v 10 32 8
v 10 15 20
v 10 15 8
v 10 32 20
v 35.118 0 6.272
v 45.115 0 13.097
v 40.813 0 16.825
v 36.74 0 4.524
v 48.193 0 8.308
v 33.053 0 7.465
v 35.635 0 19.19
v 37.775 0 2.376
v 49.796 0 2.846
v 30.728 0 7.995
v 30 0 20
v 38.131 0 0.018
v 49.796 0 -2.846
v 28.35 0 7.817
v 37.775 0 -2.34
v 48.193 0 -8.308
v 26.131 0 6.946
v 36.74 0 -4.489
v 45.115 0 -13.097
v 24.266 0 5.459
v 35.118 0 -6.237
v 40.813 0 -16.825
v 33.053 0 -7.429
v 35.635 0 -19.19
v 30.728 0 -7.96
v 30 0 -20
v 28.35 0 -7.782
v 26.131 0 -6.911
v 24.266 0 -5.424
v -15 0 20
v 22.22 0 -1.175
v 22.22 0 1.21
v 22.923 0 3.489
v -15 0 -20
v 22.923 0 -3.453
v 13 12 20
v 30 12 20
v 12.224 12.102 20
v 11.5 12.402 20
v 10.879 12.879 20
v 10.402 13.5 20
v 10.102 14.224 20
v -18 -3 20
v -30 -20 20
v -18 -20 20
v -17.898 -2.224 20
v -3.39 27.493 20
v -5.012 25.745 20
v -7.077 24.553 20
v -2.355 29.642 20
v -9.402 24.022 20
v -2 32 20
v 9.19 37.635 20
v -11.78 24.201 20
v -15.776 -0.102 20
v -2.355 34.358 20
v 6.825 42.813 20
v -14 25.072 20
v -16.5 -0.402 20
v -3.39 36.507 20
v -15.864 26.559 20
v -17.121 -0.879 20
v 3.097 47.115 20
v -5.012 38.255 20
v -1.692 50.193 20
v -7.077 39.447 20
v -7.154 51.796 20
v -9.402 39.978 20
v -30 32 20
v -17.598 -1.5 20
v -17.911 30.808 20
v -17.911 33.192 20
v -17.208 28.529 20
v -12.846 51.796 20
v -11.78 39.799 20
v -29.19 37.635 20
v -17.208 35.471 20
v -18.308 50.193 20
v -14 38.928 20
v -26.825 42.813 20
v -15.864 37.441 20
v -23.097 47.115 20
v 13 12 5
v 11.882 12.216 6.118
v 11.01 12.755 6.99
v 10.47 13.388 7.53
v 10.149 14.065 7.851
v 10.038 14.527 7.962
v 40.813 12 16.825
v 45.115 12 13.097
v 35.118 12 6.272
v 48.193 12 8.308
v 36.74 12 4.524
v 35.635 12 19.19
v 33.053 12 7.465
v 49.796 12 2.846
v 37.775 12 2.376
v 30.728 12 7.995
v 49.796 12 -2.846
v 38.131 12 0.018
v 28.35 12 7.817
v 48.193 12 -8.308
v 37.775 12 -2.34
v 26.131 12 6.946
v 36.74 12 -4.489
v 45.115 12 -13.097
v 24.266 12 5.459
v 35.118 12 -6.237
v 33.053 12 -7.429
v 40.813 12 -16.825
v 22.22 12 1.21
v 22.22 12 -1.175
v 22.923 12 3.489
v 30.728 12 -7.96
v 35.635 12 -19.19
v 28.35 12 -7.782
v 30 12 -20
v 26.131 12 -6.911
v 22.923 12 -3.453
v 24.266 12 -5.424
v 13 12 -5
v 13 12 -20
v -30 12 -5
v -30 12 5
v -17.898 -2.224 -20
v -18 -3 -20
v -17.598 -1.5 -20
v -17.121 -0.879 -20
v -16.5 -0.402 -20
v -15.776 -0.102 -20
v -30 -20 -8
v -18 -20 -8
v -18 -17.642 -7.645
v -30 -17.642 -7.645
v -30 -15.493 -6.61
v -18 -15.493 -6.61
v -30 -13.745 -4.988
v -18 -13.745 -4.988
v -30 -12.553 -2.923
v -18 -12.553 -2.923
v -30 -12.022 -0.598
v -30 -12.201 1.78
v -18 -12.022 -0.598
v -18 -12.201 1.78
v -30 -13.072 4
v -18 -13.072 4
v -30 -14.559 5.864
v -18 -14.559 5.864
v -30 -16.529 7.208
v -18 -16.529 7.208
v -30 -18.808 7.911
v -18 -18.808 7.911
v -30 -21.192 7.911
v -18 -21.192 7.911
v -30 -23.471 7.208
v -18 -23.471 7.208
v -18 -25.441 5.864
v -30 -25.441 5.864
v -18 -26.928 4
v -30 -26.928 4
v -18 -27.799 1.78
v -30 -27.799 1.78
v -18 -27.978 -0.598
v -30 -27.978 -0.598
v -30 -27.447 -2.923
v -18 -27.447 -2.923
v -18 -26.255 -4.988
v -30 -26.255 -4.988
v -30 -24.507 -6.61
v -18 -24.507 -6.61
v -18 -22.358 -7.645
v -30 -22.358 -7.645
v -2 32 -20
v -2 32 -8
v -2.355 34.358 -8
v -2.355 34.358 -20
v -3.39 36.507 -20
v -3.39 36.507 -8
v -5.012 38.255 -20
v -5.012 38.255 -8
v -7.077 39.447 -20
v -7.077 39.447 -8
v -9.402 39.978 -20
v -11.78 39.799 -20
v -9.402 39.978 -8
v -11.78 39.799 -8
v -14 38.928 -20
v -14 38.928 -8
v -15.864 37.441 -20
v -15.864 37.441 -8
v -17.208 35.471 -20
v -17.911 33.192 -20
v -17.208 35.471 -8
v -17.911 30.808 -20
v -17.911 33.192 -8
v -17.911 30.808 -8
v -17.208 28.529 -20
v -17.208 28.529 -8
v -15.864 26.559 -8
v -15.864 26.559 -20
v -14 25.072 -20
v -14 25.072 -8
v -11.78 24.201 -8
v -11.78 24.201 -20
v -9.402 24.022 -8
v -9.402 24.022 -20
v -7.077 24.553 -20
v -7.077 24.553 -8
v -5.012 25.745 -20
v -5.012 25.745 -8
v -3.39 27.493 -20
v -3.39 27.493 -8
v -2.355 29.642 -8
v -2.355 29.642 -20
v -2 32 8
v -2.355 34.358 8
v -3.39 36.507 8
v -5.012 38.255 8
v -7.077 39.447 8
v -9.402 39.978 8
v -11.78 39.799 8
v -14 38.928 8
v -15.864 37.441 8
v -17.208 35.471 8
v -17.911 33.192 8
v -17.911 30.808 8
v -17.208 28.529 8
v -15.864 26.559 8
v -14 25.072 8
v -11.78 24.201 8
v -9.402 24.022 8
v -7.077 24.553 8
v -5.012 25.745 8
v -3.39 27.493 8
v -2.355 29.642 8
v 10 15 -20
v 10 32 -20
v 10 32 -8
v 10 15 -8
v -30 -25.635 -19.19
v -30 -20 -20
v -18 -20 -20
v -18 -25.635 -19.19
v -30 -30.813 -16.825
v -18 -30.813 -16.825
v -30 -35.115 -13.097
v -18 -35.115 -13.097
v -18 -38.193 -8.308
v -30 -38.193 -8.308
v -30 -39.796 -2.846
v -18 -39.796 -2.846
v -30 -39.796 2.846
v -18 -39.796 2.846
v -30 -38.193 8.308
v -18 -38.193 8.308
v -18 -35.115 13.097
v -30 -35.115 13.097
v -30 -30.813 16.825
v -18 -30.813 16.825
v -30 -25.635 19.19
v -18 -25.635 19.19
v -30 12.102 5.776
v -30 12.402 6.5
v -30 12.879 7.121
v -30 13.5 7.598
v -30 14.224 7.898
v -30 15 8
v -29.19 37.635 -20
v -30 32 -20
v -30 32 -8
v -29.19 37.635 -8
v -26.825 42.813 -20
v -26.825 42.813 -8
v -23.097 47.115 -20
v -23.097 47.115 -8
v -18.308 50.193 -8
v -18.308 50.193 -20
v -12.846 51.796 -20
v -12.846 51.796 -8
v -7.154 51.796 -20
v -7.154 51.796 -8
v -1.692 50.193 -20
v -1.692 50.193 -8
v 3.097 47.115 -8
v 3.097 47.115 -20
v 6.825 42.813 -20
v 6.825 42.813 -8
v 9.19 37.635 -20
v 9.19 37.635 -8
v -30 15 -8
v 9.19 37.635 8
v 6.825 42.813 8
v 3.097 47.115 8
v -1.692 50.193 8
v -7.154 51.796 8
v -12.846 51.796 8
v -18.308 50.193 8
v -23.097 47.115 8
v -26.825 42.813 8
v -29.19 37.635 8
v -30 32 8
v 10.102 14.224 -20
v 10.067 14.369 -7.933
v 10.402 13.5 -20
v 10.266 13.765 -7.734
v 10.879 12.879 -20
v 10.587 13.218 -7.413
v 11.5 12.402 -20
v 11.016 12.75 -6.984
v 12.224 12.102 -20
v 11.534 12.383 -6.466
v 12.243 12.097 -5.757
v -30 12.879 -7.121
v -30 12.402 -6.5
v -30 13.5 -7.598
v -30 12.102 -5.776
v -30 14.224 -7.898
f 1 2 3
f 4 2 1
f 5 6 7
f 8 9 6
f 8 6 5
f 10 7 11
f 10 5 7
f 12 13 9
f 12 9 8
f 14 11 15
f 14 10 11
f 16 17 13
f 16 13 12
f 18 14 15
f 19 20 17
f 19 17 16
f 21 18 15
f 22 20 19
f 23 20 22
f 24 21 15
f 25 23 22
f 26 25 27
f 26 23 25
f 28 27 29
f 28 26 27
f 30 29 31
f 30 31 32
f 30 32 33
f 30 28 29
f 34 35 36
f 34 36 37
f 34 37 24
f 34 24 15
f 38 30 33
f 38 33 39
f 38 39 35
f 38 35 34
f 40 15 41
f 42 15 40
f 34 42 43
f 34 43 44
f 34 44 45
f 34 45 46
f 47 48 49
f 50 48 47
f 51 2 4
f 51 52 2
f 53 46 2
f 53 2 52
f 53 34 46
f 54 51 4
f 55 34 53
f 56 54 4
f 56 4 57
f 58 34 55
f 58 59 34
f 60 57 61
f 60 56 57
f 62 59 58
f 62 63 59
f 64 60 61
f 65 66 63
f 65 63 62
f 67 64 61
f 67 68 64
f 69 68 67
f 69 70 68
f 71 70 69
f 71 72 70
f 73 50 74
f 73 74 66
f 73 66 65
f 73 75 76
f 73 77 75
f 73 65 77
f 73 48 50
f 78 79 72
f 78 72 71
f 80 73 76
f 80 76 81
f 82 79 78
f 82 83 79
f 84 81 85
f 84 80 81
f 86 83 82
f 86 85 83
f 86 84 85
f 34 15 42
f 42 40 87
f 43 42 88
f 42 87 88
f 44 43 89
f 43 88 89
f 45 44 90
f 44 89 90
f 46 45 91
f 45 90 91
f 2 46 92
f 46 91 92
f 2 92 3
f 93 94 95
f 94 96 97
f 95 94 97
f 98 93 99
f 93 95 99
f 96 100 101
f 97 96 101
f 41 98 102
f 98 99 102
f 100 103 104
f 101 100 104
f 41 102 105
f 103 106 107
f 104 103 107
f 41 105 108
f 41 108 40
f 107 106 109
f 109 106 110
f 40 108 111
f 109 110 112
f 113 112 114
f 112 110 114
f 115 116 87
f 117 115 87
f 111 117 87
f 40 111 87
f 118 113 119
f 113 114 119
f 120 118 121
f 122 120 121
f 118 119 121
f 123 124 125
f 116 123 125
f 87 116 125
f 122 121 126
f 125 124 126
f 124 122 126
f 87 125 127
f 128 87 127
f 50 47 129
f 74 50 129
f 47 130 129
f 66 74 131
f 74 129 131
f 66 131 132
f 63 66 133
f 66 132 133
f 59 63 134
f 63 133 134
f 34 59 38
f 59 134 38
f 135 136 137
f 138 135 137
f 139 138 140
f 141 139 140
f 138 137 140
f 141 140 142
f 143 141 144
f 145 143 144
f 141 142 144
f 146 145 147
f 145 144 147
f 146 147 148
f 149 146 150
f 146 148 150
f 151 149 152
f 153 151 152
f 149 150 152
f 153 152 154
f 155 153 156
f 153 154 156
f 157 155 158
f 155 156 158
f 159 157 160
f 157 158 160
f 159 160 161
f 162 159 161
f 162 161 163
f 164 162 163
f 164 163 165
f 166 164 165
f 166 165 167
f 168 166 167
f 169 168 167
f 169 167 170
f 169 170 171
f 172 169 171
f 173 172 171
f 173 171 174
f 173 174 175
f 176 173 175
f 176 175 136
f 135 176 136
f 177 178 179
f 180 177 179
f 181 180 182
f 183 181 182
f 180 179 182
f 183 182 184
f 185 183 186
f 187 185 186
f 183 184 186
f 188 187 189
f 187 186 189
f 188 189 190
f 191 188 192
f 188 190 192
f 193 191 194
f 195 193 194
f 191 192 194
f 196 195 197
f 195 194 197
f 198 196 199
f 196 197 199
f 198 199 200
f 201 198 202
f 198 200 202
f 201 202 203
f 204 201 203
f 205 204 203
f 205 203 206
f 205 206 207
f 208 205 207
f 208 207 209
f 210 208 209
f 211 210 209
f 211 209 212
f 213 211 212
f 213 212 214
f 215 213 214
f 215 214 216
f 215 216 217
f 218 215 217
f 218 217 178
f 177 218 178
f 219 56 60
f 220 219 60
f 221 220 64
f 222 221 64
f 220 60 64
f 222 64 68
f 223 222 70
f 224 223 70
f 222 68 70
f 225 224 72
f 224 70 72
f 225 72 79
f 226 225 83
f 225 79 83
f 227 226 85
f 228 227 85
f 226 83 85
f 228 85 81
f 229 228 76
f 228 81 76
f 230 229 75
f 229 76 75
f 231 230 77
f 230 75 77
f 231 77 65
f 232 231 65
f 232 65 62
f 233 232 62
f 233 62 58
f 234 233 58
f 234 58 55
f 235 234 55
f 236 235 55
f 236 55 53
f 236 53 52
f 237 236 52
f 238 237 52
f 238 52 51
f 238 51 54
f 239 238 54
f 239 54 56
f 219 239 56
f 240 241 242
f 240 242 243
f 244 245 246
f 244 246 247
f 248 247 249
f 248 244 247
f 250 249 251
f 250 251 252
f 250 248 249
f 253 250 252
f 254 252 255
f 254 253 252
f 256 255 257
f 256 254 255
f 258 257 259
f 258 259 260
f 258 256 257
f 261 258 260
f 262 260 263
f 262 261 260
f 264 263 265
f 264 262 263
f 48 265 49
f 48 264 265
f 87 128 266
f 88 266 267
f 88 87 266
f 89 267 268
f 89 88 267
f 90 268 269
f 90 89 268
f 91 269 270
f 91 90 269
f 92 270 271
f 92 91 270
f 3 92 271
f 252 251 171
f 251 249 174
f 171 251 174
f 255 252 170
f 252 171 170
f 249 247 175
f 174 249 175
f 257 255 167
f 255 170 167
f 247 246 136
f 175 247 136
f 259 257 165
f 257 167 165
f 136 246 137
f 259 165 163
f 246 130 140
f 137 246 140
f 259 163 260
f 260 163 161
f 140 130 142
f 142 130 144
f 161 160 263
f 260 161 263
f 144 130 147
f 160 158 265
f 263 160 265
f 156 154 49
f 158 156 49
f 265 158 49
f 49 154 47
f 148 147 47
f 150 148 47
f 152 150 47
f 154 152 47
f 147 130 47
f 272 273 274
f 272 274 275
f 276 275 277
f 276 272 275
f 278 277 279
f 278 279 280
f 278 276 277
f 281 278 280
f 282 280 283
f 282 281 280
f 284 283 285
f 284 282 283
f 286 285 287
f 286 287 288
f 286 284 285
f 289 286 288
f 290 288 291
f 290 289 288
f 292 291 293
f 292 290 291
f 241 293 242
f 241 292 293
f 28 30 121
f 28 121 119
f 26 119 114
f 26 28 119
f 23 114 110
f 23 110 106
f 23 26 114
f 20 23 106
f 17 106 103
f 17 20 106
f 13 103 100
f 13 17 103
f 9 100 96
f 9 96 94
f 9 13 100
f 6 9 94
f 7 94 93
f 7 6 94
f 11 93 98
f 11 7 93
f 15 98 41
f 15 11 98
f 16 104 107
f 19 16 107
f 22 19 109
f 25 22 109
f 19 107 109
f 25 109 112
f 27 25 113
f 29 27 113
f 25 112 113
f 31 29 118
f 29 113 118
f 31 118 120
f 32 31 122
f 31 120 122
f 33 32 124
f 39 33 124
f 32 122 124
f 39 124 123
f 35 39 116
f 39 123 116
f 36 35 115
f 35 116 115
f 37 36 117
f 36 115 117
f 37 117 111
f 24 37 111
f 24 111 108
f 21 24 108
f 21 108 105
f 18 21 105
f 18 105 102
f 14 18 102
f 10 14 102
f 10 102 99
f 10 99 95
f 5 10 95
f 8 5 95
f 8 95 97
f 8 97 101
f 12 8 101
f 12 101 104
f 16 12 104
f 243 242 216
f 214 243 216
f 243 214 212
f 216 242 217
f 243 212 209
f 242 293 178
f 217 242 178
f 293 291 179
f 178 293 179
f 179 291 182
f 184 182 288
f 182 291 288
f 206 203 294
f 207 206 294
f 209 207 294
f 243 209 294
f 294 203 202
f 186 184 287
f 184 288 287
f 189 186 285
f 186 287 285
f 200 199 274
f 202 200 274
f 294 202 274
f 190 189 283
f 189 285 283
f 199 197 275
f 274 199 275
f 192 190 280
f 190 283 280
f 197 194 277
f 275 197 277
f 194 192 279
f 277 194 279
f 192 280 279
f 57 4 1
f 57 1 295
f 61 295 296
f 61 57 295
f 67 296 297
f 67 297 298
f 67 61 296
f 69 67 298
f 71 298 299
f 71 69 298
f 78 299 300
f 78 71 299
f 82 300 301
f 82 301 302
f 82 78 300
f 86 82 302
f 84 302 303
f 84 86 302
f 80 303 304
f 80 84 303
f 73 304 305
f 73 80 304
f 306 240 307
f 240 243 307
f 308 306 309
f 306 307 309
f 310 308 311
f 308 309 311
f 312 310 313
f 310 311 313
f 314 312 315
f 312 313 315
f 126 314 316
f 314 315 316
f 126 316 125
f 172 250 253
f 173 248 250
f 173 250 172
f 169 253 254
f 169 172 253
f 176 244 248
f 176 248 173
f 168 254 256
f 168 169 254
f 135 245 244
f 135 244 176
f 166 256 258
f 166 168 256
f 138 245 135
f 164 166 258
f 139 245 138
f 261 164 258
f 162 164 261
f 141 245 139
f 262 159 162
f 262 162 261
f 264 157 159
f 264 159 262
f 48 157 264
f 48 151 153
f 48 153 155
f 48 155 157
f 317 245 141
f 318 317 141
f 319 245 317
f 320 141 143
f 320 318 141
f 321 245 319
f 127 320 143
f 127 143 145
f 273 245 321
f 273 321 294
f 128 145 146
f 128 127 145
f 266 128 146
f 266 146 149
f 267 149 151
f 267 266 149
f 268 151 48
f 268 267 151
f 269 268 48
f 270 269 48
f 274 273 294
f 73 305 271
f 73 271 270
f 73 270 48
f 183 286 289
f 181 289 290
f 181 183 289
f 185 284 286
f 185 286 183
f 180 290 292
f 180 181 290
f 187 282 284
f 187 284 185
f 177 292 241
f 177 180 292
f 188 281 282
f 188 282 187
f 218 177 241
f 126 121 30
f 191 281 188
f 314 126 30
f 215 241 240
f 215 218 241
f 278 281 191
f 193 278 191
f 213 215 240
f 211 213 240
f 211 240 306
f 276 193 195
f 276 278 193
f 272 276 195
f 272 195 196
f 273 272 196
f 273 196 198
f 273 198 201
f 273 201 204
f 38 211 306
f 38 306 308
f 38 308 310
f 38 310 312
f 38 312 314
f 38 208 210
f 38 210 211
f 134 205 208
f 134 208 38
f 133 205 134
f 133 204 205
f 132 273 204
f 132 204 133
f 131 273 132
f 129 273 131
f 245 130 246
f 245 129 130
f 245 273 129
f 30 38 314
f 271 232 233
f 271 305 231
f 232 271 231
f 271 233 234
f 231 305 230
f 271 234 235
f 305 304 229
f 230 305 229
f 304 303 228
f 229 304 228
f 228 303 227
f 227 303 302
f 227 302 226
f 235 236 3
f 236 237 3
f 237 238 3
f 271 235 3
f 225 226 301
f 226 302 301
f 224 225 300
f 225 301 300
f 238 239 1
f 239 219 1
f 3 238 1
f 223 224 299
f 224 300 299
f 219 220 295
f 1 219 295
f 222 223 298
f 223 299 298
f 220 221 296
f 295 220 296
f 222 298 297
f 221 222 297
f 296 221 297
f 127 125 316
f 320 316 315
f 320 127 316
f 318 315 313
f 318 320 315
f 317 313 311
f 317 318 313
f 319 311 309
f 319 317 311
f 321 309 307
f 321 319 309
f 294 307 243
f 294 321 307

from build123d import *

# Parameters (mm, degrees)
BOSS_EXTRUDE1_DEPTH  = 12
BOSS_EXTRUDE11_DEPTH = 12
BOSS_EXTRUDE12_DEPTH = 12
BOSS_EXTRUDE13_DEPTH = 12
SKETCH8_R            = 8
CUT_EXTRUDE1_DEPTH   = 128
SKETCH9_R            = 8
CUT_EXTRUDE2_DEPTH   = 128
SKETCH10_R           = 8
CUT_EXTRUDE4_DEPTH   = 128
FILLET4_R            = 3


with BuildPart() as part:
    # Sketch2 → Boss-Extrude1 (new body)
    with BuildSketch(Plane(origin=(0, 0, 0), x_dir=(1, 0, 0), z_dir=(0, 1, 0))):
        with BuildLine():
            Line((-30, 20), (30, 20))
            ThreePointArc((30, 20), (50, 0), (30, -20))
            Line((30, -20), (-30, -20))
            Line((-30, -20), (-30, 20))
        make_face()
    extrude(amount=BOSS_EXTRUDE1_DEPTH)

    # Sketch3 → Boss-Extrude11 (add)
    with BuildSketch(Plane.XY.offset(20)):
        with BuildLine():
            ThreePointArc((10, 32), (-10, 52), (-30, 32))
            Line((-30, 32), (10, 32))
        make_face()
        with BuildLine():
            ThreePointArc((-30, 32), (-24.142135624, 17.857864376), (-10, 12))
            ThreePointArc((-10, 12), (4.142135624, 17.857864376), (10, 32))
            Line((10, 32), (-30, 32))
        make_face()
        with BuildLine():
            Line((-30, 32), (-30, 12))
            Line((-30, 12), (-10, 12))
            ThreePointArc((-10, 12), (-24.142135624, 17.857864376), (-30, 32))
        make_face()
        with BuildLine():
            ThreePointArc((10, 32), (4.142135624, 17.857864376), (-10, 12))
            Line((-10, 12), (10, 12))
            Line((10, 12), (10, 32))
        make_face()
    extrude(amount=-BOSS_EXTRUDE11_DEPTH)

    # Sketch5 → Boss-Extrude12 (add)
    with BuildSketch(Plane(origin=(0, 0, -20), x_dir=(-1, 0, 0), z_dir=(0, 0, -1))):
        with BuildLine():
            Line((10, 12), (30, 12))
            Line((30, 12), (30, 32))
            ThreePointArc((30, 32), (24.142135624, 17.857864376), (10, 12))
        make_face()
        with BuildLine():
            Line((-10, 12), (10, 12))
            ThreePointArc((10, 12), (-4.142135624, 17.857864376), (-10, 32))
            Line((-10, 32), (-10, 12))
        make_face()
        with BuildLine():
            ThreePointArc((-10, 32), (-4.142135624, 17.857864376), (10, 12))
            ThreePointArc((10, 12), (24.142135624, 17.857864376), (30, 32))
            Line((30, 32), (-10, 32))
        make_face()
        with BuildLine():
            Line((-10, 32), (30, 32))
            ThreePointArc((30, 32), (10, 52), (-10, 32))
        make_face()
    extrude(amount=-BOSS_EXTRUDE12_DEPTH)

    # Sketch6 → Boss-Extrude13 (add)
    with BuildSketch(Plane.ZY.offset(30)):
        with BuildLine():
            Line((20, 0), (0, 0))
            ThreePointArc((0, 0), (14.142135624, -5.857864376), (20, -20))
            Line((20, -20), (20, 0))
        make_face()
        with BuildLine():
            Line((0, 0), (-20, 0))
            Line((-20, 0), (-20, -20))
            ThreePointArc((-20, -20), (-14.142135624, -5.857864376), (0, 0))
        make_face()
        with BuildLine():
            ThreePointArc((20, -20), (14.142135624, -5.857864376), (0, 0))
            ThreePointArc((0, 0), (-14.142135624, -5.857864376), (-20, -20))
            Line((-20, -20), (20, -20))
        make_face()
        with BuildLine():
            Line((20, -20), (-20, -20))
            ThreePointArc((-20, -20), (0, -40), (20, -20))
        make_face()
    extrude(amount=-BOSS_EXTRUDE13_DEPTH)

    # Sketch8 → Cut-Extrude1 (cut)
    with BuildSketch(Plane.XY.offset(20)):
        with Locations((-10, 32)):
            Circle(SKETCH8_R)
    extrude(amount=-CUT_EXTRUDE1_DEPTH, mode=Mode.SUBTRACT)

    # Sketch9 → Cut-Extrude2 (cut)
    with BuildSketch(Plane(origin=(0, 12, 0), x_dir=(1, 0, 0), z_dir=(0, 1, 0))):
        with Locations((30.130515164, -0.017591691)):
            Circle(SKETCH9_R)
    extrude(amount=-CUT_EXTRUDE2_DEPTH, mode=Mode.SUBTRACT)

    # Sketch10 → Cut-Extrude4 (cut)
    with BuildSketch(Plane(origin=(-18, 0, 0), x_dir=(0, 0, -1), z_dir=(1, 0, 0))):
        with Locations((0, -20)):
            Circle(SKETCH10_R)
    extrude(amount=-CUT_EXTRUDE4_DEPTH, mode=Mode.SUBTRACT)

    # Fillet4
    fillet4_edges = [part.edges().sort_by_distance(p)[0] for p in [
        (10, 12, 14),
        (-10, 12, 8),
        (10, 12, -14),
        (-10, 12, -8),
        (-18, 0, 0),
    ]]
    fillet(fillet4_edges, radius=FILLET4_R)


solid = part.part
